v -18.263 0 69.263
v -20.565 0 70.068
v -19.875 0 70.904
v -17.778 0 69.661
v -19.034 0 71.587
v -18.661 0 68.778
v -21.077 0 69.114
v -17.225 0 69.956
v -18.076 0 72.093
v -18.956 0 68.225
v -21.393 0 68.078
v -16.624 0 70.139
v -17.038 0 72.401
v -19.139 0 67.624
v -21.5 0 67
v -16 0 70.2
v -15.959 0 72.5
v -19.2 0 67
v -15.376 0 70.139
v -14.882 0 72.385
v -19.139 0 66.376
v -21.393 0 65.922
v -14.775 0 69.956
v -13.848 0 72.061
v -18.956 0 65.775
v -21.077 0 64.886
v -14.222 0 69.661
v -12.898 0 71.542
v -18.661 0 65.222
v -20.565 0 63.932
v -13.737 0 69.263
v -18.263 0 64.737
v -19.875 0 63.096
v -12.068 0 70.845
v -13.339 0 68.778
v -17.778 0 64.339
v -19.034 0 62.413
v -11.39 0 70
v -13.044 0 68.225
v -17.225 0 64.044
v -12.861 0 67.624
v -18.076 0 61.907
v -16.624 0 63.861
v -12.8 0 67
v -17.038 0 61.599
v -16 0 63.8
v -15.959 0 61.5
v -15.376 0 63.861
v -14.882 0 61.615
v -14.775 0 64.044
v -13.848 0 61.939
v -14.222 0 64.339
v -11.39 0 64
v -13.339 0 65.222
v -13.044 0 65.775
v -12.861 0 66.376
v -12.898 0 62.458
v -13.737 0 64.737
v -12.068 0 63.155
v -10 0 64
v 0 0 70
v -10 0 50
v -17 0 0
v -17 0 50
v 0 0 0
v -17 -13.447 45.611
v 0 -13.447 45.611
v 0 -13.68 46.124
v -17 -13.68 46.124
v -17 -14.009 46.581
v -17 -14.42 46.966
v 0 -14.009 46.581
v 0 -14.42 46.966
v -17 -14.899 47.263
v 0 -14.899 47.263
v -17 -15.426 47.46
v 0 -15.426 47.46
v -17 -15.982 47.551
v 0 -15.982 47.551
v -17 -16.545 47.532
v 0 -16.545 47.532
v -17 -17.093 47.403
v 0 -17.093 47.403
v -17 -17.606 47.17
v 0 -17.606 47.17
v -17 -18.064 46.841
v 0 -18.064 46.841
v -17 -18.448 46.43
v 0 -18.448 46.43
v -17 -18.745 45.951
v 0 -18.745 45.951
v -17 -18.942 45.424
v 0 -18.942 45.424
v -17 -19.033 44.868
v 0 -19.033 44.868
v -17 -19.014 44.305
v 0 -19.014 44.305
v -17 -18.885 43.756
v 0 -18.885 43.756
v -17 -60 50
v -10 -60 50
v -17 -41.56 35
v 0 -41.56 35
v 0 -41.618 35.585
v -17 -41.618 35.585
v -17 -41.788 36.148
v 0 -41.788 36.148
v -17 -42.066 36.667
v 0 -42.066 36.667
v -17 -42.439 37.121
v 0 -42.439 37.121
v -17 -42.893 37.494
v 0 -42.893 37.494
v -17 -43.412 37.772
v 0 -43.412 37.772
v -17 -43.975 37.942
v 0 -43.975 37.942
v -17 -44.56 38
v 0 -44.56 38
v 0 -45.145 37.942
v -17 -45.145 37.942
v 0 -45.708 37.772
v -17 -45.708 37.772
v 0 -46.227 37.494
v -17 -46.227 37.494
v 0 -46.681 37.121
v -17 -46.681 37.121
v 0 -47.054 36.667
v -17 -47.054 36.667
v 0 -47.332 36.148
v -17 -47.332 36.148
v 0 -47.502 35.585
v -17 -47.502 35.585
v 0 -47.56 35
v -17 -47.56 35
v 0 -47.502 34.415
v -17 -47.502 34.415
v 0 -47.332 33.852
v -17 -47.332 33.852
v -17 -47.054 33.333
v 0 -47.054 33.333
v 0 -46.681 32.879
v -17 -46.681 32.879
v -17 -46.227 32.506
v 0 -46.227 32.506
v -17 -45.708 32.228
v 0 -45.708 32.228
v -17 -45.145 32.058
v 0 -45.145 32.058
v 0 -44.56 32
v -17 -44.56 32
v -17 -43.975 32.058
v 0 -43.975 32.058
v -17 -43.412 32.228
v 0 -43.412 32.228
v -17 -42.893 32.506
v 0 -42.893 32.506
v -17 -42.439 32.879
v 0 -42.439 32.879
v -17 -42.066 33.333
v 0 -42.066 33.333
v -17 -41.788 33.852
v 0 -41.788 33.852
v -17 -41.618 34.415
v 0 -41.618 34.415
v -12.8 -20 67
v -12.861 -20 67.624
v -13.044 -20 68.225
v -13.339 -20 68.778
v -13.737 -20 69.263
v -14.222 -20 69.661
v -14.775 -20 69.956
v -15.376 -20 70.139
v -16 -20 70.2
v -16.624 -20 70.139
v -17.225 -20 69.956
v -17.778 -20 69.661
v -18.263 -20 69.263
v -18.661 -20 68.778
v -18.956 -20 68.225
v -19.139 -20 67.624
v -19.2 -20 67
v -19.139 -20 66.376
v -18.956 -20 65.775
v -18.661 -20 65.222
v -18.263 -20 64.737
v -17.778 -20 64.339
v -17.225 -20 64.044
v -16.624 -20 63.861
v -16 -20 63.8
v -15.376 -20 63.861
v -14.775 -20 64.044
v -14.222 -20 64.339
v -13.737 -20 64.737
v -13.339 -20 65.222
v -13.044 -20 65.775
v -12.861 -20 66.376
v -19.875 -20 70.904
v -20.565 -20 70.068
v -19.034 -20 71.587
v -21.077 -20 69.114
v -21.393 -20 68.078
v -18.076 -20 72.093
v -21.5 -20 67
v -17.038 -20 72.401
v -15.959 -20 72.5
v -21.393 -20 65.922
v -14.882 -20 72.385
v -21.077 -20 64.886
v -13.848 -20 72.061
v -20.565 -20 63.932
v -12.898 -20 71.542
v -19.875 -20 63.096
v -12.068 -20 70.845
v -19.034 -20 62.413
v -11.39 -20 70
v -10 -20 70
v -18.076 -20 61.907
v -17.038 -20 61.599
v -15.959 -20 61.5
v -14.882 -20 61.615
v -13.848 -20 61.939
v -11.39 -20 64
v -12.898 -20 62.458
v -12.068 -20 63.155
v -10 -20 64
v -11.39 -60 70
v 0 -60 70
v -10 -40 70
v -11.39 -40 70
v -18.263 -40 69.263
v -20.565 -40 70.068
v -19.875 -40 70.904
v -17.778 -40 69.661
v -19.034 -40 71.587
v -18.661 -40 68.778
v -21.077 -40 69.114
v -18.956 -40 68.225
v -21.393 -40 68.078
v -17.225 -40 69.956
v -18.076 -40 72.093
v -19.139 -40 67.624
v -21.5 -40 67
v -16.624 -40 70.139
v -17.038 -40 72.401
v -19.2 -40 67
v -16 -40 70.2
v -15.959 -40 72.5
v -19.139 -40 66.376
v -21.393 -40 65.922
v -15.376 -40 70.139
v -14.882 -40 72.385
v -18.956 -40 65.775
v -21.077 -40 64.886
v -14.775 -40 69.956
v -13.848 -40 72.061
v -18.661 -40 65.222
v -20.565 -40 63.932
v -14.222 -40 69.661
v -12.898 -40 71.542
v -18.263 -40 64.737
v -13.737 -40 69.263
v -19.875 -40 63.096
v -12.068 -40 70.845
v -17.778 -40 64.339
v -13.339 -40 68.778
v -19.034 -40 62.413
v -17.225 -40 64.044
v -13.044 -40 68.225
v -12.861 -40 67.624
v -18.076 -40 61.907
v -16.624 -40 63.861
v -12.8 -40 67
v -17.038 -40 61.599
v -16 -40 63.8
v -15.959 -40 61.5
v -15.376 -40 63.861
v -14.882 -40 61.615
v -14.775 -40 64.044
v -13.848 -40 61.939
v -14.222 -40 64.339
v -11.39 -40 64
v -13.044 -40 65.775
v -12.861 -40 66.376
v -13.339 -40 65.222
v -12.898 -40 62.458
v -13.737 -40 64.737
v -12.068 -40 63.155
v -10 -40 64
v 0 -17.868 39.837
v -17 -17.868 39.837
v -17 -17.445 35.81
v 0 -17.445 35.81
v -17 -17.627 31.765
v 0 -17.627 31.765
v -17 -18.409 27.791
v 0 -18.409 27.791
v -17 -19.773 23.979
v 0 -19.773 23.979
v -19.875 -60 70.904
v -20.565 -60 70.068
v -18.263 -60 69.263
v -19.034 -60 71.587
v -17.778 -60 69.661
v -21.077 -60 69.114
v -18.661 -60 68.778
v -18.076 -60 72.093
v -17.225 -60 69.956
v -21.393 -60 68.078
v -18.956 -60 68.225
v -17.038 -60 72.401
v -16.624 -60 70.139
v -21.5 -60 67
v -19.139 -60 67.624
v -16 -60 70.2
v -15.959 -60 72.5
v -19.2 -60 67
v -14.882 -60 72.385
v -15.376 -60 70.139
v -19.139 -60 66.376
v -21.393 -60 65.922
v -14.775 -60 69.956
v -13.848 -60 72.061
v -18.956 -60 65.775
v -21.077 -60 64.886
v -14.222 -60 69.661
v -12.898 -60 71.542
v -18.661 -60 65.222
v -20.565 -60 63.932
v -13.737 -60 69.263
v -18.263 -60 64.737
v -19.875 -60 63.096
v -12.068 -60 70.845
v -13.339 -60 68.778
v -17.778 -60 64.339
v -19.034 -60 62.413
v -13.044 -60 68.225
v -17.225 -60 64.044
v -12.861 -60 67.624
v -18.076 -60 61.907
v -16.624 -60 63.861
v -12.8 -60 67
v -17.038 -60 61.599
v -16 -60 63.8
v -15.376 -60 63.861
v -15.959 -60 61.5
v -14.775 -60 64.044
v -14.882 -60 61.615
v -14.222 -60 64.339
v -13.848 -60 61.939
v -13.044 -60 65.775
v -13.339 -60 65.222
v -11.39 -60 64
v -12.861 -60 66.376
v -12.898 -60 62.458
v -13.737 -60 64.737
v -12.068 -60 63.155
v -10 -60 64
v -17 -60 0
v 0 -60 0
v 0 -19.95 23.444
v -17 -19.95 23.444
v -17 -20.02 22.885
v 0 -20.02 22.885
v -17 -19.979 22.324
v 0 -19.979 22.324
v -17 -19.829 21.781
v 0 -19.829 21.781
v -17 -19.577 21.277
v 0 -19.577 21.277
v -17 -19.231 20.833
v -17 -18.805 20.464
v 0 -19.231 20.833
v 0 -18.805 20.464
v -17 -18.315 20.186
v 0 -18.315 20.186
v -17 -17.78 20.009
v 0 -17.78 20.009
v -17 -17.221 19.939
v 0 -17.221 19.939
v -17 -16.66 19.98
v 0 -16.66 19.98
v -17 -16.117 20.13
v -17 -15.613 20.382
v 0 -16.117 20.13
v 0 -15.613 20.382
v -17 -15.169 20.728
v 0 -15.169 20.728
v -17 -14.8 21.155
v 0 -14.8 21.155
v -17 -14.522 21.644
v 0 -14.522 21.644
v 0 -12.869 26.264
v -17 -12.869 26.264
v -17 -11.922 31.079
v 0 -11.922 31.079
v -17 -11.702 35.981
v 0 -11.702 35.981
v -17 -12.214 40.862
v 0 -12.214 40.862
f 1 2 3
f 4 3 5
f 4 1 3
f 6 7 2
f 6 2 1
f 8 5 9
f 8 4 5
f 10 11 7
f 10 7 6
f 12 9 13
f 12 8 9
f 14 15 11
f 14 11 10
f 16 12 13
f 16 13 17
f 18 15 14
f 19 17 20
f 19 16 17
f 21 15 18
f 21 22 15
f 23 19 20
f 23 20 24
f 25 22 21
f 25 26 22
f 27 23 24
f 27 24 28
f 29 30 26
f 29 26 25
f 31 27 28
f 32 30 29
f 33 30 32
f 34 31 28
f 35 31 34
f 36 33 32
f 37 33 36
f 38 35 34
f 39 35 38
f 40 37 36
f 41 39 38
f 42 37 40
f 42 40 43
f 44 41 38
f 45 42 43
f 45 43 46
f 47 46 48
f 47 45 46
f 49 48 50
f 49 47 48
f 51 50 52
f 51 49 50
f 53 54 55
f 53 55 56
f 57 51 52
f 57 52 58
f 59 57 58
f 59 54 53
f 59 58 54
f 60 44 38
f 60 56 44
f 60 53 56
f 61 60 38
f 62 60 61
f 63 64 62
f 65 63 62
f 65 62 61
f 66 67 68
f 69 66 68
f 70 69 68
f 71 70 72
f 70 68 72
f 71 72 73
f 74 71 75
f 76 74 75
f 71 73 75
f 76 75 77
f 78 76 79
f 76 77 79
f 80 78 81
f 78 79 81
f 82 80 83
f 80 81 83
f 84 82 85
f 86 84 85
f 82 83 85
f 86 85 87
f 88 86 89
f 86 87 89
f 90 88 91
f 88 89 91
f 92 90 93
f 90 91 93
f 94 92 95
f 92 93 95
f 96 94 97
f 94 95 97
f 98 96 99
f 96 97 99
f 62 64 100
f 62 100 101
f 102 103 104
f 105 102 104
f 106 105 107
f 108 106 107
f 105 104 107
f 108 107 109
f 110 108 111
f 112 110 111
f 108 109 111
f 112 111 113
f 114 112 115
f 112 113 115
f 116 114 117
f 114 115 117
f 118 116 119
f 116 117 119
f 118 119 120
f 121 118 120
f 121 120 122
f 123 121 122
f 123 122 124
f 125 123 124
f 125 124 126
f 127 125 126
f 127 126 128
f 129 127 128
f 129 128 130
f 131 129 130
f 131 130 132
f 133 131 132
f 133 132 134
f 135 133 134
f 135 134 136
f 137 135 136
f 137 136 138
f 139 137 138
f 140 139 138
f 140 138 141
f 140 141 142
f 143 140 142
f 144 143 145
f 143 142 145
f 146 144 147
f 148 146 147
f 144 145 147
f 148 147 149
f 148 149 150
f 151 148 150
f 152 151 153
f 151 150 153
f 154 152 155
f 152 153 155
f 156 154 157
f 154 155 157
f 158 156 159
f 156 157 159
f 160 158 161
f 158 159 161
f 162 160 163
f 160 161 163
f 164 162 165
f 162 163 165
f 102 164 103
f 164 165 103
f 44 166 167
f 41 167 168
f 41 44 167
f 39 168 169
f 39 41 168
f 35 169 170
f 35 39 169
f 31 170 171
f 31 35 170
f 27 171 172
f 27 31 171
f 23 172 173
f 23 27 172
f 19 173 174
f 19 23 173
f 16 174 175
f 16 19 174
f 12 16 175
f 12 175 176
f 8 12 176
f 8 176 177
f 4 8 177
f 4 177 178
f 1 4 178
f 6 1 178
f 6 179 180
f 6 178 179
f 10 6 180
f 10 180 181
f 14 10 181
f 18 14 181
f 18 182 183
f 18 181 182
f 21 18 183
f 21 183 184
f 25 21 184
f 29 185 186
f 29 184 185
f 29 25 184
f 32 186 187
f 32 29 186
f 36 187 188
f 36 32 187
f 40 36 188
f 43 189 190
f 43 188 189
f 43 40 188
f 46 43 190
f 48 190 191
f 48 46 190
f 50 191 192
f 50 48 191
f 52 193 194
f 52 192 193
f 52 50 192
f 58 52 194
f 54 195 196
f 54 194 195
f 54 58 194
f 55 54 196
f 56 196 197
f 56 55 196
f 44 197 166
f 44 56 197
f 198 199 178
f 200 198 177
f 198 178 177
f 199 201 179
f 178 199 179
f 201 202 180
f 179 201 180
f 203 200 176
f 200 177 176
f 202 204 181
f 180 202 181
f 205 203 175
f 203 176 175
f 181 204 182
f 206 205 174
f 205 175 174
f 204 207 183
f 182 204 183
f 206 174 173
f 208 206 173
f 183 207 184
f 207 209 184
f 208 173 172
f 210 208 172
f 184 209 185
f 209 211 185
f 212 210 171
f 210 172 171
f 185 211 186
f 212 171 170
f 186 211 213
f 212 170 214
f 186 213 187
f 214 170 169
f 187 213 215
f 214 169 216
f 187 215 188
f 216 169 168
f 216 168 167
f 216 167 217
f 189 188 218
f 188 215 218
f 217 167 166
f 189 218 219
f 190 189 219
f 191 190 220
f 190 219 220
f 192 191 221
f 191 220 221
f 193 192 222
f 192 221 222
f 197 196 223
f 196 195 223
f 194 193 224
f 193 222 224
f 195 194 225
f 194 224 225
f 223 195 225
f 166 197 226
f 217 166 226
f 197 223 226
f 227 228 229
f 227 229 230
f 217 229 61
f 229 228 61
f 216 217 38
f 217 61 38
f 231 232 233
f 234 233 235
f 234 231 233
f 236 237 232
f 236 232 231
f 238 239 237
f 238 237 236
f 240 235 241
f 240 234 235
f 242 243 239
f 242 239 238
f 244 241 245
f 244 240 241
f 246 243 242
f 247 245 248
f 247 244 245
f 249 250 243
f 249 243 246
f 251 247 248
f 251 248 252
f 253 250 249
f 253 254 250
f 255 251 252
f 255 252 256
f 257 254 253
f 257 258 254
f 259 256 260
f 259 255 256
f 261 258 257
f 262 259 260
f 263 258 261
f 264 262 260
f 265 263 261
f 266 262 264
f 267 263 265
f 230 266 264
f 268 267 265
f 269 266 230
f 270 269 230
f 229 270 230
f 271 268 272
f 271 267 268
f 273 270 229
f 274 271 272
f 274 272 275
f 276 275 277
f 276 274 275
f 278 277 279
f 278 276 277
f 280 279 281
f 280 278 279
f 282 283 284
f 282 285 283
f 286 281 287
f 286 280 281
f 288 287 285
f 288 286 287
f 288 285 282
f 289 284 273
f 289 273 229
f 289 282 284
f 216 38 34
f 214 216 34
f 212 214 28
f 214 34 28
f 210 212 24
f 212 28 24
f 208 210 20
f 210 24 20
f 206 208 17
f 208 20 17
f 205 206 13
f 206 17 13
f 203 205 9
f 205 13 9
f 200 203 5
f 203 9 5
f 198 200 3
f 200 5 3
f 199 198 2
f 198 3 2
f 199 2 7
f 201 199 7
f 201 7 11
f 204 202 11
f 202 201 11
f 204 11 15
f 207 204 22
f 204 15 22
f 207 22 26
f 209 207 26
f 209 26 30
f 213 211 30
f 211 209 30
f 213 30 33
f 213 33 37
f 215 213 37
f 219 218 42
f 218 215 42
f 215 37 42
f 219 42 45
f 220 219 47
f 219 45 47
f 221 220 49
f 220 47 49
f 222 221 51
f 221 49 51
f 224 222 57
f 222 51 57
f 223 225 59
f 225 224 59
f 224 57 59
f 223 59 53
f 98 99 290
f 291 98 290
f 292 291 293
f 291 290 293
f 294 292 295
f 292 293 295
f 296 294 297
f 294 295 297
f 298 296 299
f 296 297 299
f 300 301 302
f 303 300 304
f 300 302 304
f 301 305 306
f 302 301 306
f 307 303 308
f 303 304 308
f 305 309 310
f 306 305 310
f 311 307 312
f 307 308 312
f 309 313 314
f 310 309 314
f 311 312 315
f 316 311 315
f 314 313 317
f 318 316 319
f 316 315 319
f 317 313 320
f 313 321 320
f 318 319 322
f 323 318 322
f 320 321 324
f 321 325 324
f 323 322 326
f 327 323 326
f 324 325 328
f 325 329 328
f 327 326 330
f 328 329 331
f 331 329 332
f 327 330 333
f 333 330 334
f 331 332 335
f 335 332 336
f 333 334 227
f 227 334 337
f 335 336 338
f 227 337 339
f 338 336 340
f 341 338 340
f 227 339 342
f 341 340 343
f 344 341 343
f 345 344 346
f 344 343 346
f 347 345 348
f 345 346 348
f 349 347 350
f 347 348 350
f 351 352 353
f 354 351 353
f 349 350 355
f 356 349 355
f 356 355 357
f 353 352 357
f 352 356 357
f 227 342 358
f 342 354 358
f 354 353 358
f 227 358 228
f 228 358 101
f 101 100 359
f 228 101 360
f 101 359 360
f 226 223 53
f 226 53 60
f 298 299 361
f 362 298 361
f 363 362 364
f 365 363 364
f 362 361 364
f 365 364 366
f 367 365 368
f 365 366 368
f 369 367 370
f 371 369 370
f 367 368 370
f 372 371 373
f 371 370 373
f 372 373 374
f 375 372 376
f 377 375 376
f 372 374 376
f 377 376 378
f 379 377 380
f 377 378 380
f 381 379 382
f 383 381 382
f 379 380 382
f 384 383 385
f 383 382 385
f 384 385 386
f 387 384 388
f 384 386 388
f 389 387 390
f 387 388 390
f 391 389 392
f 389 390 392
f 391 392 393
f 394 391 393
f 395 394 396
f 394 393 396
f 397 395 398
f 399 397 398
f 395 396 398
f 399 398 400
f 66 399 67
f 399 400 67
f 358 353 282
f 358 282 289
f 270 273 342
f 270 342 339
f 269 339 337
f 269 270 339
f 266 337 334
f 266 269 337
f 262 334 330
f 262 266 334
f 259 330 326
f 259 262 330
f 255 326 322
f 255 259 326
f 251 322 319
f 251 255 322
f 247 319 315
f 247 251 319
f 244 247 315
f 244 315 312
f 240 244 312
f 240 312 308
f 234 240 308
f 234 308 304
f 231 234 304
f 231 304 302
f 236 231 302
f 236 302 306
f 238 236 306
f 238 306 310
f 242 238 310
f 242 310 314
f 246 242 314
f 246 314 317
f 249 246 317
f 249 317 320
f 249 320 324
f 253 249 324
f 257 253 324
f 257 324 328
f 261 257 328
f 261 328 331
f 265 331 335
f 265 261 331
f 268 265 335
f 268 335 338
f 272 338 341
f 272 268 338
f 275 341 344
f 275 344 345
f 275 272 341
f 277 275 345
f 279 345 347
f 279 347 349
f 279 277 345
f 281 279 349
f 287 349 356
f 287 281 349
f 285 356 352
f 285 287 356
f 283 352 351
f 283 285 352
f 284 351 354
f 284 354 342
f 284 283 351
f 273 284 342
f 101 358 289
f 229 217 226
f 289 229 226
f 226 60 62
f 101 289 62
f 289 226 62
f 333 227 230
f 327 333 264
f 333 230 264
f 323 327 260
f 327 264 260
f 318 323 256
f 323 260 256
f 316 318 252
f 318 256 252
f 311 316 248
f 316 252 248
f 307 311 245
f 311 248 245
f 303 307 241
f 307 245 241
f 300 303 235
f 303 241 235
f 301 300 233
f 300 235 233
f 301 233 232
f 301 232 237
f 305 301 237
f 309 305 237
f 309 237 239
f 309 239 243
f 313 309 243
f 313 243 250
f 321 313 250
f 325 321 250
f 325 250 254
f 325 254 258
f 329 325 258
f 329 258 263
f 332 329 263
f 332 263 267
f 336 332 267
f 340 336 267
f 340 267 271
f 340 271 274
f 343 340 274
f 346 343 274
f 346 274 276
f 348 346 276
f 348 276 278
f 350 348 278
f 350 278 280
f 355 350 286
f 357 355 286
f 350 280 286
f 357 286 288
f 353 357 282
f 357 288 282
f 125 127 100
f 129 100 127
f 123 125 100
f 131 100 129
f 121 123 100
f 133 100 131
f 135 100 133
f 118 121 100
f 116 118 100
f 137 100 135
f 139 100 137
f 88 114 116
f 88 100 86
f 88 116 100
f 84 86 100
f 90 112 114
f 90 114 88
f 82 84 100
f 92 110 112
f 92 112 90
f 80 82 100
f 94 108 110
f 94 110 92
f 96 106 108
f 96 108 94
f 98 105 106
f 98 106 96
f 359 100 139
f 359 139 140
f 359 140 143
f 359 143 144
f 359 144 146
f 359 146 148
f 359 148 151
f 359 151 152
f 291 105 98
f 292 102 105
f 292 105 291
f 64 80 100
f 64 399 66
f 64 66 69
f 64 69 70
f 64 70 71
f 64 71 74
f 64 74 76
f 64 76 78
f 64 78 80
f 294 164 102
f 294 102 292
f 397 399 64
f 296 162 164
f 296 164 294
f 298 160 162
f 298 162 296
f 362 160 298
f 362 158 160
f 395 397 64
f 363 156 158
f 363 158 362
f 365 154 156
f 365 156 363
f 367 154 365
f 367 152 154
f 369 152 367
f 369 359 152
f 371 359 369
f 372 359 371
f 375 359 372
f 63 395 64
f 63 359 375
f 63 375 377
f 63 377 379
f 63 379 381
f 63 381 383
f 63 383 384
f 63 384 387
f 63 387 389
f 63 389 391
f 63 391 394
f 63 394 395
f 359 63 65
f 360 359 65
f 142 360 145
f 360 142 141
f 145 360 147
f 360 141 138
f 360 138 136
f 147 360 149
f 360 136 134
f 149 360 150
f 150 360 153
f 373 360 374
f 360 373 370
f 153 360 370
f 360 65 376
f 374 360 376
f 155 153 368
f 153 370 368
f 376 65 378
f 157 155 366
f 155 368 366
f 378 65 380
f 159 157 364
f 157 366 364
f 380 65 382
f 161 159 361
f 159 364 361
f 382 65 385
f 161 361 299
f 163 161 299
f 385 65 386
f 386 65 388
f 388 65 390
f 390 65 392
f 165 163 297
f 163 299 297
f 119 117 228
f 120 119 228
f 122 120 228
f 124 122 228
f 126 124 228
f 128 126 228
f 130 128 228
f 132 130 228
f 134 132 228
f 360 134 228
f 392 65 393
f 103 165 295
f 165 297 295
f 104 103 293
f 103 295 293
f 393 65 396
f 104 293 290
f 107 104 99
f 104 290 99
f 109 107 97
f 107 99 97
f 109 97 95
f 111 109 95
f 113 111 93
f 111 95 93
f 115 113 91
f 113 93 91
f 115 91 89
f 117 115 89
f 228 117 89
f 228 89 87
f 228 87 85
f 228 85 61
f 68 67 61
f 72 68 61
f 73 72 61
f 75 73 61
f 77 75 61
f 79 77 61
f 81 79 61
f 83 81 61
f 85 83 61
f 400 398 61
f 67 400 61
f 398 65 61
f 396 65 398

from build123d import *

# Parameters (mm, degrees)
F0_R     = 3.2
F1_DEPTH = 60
F2_W     = 23.016388
F2_H     = 20
F3_DEPTH = 72.501
F4_W     = 17
F4_H     = 60
F5_DEPTH = 50
F6_R     = 3
F7_DEPTH = 25


with BuildPart() as f1:
    # F0 (on Front) → F1 (new body)
    with BuildSketch(Plane.XZ):
        with BuildLine():
            Line((-10, 64), (-10, 0))
            Line((-10, 0), (0, 0))
            Line((0, 0), (0, 70))
            Line((0, 70), (-11.390228, 70))
            ThreePointArc((-11.390228, 70), (-21.5, 67), (-11.390228, 64))
            Line((-11.390228, 64), (-10, 64))
        make_face()
        with Locations((-16, 67)):
            Circle(F0_R, mode=Mode.SUBTRACT)
    extrude(amount=F1_DEPTH)

    # F2 (on Top) → F3 (cut, through all)
    with BuildSketch(Plane.XY):
        with Locations((-21.508194, -30)):
            Rectangle(F2_W, F2_H)
    extrude(amount=F3_DEPTH, mode=Mode.SUBTRACT)

    # F4 (on Top) → F5 (join)
    with BuildSketch(Plane.XY):
        with Locations((-8.5, -30)):
            Rectangle(F4_W, F4_H)
    extrude(amount=F5_DEPTH)

    # F6 (on face) → F7 (cut)
    with BuildSketch(Plane.YZ):
        with Locations((-44.56006, 35)):
            Circle(F6_R)
        with BuildLine():
            ThreePointArc((-18.885411, 43.756471), (-17.460533, 33.783836), (-19.772981, 23.978923))
            ThreePointArc((-19.772981, 23.978923), (-18.314924, 20.18622), (-14.52222, 21.644278))
            ThreePointArc((-14.52222, 21.644278), (-11.719915, 33.52621), (-13.446631, 45.611395))
            ThreePointArc((-13.446631, 45.611395), (-17.093483, 47.403323), (-18.885411, 43.756471))
        make_face()
    extrude(amount=-F7_DEPTH, mode=Mode.SUBTRACT)


solid = f1.part
